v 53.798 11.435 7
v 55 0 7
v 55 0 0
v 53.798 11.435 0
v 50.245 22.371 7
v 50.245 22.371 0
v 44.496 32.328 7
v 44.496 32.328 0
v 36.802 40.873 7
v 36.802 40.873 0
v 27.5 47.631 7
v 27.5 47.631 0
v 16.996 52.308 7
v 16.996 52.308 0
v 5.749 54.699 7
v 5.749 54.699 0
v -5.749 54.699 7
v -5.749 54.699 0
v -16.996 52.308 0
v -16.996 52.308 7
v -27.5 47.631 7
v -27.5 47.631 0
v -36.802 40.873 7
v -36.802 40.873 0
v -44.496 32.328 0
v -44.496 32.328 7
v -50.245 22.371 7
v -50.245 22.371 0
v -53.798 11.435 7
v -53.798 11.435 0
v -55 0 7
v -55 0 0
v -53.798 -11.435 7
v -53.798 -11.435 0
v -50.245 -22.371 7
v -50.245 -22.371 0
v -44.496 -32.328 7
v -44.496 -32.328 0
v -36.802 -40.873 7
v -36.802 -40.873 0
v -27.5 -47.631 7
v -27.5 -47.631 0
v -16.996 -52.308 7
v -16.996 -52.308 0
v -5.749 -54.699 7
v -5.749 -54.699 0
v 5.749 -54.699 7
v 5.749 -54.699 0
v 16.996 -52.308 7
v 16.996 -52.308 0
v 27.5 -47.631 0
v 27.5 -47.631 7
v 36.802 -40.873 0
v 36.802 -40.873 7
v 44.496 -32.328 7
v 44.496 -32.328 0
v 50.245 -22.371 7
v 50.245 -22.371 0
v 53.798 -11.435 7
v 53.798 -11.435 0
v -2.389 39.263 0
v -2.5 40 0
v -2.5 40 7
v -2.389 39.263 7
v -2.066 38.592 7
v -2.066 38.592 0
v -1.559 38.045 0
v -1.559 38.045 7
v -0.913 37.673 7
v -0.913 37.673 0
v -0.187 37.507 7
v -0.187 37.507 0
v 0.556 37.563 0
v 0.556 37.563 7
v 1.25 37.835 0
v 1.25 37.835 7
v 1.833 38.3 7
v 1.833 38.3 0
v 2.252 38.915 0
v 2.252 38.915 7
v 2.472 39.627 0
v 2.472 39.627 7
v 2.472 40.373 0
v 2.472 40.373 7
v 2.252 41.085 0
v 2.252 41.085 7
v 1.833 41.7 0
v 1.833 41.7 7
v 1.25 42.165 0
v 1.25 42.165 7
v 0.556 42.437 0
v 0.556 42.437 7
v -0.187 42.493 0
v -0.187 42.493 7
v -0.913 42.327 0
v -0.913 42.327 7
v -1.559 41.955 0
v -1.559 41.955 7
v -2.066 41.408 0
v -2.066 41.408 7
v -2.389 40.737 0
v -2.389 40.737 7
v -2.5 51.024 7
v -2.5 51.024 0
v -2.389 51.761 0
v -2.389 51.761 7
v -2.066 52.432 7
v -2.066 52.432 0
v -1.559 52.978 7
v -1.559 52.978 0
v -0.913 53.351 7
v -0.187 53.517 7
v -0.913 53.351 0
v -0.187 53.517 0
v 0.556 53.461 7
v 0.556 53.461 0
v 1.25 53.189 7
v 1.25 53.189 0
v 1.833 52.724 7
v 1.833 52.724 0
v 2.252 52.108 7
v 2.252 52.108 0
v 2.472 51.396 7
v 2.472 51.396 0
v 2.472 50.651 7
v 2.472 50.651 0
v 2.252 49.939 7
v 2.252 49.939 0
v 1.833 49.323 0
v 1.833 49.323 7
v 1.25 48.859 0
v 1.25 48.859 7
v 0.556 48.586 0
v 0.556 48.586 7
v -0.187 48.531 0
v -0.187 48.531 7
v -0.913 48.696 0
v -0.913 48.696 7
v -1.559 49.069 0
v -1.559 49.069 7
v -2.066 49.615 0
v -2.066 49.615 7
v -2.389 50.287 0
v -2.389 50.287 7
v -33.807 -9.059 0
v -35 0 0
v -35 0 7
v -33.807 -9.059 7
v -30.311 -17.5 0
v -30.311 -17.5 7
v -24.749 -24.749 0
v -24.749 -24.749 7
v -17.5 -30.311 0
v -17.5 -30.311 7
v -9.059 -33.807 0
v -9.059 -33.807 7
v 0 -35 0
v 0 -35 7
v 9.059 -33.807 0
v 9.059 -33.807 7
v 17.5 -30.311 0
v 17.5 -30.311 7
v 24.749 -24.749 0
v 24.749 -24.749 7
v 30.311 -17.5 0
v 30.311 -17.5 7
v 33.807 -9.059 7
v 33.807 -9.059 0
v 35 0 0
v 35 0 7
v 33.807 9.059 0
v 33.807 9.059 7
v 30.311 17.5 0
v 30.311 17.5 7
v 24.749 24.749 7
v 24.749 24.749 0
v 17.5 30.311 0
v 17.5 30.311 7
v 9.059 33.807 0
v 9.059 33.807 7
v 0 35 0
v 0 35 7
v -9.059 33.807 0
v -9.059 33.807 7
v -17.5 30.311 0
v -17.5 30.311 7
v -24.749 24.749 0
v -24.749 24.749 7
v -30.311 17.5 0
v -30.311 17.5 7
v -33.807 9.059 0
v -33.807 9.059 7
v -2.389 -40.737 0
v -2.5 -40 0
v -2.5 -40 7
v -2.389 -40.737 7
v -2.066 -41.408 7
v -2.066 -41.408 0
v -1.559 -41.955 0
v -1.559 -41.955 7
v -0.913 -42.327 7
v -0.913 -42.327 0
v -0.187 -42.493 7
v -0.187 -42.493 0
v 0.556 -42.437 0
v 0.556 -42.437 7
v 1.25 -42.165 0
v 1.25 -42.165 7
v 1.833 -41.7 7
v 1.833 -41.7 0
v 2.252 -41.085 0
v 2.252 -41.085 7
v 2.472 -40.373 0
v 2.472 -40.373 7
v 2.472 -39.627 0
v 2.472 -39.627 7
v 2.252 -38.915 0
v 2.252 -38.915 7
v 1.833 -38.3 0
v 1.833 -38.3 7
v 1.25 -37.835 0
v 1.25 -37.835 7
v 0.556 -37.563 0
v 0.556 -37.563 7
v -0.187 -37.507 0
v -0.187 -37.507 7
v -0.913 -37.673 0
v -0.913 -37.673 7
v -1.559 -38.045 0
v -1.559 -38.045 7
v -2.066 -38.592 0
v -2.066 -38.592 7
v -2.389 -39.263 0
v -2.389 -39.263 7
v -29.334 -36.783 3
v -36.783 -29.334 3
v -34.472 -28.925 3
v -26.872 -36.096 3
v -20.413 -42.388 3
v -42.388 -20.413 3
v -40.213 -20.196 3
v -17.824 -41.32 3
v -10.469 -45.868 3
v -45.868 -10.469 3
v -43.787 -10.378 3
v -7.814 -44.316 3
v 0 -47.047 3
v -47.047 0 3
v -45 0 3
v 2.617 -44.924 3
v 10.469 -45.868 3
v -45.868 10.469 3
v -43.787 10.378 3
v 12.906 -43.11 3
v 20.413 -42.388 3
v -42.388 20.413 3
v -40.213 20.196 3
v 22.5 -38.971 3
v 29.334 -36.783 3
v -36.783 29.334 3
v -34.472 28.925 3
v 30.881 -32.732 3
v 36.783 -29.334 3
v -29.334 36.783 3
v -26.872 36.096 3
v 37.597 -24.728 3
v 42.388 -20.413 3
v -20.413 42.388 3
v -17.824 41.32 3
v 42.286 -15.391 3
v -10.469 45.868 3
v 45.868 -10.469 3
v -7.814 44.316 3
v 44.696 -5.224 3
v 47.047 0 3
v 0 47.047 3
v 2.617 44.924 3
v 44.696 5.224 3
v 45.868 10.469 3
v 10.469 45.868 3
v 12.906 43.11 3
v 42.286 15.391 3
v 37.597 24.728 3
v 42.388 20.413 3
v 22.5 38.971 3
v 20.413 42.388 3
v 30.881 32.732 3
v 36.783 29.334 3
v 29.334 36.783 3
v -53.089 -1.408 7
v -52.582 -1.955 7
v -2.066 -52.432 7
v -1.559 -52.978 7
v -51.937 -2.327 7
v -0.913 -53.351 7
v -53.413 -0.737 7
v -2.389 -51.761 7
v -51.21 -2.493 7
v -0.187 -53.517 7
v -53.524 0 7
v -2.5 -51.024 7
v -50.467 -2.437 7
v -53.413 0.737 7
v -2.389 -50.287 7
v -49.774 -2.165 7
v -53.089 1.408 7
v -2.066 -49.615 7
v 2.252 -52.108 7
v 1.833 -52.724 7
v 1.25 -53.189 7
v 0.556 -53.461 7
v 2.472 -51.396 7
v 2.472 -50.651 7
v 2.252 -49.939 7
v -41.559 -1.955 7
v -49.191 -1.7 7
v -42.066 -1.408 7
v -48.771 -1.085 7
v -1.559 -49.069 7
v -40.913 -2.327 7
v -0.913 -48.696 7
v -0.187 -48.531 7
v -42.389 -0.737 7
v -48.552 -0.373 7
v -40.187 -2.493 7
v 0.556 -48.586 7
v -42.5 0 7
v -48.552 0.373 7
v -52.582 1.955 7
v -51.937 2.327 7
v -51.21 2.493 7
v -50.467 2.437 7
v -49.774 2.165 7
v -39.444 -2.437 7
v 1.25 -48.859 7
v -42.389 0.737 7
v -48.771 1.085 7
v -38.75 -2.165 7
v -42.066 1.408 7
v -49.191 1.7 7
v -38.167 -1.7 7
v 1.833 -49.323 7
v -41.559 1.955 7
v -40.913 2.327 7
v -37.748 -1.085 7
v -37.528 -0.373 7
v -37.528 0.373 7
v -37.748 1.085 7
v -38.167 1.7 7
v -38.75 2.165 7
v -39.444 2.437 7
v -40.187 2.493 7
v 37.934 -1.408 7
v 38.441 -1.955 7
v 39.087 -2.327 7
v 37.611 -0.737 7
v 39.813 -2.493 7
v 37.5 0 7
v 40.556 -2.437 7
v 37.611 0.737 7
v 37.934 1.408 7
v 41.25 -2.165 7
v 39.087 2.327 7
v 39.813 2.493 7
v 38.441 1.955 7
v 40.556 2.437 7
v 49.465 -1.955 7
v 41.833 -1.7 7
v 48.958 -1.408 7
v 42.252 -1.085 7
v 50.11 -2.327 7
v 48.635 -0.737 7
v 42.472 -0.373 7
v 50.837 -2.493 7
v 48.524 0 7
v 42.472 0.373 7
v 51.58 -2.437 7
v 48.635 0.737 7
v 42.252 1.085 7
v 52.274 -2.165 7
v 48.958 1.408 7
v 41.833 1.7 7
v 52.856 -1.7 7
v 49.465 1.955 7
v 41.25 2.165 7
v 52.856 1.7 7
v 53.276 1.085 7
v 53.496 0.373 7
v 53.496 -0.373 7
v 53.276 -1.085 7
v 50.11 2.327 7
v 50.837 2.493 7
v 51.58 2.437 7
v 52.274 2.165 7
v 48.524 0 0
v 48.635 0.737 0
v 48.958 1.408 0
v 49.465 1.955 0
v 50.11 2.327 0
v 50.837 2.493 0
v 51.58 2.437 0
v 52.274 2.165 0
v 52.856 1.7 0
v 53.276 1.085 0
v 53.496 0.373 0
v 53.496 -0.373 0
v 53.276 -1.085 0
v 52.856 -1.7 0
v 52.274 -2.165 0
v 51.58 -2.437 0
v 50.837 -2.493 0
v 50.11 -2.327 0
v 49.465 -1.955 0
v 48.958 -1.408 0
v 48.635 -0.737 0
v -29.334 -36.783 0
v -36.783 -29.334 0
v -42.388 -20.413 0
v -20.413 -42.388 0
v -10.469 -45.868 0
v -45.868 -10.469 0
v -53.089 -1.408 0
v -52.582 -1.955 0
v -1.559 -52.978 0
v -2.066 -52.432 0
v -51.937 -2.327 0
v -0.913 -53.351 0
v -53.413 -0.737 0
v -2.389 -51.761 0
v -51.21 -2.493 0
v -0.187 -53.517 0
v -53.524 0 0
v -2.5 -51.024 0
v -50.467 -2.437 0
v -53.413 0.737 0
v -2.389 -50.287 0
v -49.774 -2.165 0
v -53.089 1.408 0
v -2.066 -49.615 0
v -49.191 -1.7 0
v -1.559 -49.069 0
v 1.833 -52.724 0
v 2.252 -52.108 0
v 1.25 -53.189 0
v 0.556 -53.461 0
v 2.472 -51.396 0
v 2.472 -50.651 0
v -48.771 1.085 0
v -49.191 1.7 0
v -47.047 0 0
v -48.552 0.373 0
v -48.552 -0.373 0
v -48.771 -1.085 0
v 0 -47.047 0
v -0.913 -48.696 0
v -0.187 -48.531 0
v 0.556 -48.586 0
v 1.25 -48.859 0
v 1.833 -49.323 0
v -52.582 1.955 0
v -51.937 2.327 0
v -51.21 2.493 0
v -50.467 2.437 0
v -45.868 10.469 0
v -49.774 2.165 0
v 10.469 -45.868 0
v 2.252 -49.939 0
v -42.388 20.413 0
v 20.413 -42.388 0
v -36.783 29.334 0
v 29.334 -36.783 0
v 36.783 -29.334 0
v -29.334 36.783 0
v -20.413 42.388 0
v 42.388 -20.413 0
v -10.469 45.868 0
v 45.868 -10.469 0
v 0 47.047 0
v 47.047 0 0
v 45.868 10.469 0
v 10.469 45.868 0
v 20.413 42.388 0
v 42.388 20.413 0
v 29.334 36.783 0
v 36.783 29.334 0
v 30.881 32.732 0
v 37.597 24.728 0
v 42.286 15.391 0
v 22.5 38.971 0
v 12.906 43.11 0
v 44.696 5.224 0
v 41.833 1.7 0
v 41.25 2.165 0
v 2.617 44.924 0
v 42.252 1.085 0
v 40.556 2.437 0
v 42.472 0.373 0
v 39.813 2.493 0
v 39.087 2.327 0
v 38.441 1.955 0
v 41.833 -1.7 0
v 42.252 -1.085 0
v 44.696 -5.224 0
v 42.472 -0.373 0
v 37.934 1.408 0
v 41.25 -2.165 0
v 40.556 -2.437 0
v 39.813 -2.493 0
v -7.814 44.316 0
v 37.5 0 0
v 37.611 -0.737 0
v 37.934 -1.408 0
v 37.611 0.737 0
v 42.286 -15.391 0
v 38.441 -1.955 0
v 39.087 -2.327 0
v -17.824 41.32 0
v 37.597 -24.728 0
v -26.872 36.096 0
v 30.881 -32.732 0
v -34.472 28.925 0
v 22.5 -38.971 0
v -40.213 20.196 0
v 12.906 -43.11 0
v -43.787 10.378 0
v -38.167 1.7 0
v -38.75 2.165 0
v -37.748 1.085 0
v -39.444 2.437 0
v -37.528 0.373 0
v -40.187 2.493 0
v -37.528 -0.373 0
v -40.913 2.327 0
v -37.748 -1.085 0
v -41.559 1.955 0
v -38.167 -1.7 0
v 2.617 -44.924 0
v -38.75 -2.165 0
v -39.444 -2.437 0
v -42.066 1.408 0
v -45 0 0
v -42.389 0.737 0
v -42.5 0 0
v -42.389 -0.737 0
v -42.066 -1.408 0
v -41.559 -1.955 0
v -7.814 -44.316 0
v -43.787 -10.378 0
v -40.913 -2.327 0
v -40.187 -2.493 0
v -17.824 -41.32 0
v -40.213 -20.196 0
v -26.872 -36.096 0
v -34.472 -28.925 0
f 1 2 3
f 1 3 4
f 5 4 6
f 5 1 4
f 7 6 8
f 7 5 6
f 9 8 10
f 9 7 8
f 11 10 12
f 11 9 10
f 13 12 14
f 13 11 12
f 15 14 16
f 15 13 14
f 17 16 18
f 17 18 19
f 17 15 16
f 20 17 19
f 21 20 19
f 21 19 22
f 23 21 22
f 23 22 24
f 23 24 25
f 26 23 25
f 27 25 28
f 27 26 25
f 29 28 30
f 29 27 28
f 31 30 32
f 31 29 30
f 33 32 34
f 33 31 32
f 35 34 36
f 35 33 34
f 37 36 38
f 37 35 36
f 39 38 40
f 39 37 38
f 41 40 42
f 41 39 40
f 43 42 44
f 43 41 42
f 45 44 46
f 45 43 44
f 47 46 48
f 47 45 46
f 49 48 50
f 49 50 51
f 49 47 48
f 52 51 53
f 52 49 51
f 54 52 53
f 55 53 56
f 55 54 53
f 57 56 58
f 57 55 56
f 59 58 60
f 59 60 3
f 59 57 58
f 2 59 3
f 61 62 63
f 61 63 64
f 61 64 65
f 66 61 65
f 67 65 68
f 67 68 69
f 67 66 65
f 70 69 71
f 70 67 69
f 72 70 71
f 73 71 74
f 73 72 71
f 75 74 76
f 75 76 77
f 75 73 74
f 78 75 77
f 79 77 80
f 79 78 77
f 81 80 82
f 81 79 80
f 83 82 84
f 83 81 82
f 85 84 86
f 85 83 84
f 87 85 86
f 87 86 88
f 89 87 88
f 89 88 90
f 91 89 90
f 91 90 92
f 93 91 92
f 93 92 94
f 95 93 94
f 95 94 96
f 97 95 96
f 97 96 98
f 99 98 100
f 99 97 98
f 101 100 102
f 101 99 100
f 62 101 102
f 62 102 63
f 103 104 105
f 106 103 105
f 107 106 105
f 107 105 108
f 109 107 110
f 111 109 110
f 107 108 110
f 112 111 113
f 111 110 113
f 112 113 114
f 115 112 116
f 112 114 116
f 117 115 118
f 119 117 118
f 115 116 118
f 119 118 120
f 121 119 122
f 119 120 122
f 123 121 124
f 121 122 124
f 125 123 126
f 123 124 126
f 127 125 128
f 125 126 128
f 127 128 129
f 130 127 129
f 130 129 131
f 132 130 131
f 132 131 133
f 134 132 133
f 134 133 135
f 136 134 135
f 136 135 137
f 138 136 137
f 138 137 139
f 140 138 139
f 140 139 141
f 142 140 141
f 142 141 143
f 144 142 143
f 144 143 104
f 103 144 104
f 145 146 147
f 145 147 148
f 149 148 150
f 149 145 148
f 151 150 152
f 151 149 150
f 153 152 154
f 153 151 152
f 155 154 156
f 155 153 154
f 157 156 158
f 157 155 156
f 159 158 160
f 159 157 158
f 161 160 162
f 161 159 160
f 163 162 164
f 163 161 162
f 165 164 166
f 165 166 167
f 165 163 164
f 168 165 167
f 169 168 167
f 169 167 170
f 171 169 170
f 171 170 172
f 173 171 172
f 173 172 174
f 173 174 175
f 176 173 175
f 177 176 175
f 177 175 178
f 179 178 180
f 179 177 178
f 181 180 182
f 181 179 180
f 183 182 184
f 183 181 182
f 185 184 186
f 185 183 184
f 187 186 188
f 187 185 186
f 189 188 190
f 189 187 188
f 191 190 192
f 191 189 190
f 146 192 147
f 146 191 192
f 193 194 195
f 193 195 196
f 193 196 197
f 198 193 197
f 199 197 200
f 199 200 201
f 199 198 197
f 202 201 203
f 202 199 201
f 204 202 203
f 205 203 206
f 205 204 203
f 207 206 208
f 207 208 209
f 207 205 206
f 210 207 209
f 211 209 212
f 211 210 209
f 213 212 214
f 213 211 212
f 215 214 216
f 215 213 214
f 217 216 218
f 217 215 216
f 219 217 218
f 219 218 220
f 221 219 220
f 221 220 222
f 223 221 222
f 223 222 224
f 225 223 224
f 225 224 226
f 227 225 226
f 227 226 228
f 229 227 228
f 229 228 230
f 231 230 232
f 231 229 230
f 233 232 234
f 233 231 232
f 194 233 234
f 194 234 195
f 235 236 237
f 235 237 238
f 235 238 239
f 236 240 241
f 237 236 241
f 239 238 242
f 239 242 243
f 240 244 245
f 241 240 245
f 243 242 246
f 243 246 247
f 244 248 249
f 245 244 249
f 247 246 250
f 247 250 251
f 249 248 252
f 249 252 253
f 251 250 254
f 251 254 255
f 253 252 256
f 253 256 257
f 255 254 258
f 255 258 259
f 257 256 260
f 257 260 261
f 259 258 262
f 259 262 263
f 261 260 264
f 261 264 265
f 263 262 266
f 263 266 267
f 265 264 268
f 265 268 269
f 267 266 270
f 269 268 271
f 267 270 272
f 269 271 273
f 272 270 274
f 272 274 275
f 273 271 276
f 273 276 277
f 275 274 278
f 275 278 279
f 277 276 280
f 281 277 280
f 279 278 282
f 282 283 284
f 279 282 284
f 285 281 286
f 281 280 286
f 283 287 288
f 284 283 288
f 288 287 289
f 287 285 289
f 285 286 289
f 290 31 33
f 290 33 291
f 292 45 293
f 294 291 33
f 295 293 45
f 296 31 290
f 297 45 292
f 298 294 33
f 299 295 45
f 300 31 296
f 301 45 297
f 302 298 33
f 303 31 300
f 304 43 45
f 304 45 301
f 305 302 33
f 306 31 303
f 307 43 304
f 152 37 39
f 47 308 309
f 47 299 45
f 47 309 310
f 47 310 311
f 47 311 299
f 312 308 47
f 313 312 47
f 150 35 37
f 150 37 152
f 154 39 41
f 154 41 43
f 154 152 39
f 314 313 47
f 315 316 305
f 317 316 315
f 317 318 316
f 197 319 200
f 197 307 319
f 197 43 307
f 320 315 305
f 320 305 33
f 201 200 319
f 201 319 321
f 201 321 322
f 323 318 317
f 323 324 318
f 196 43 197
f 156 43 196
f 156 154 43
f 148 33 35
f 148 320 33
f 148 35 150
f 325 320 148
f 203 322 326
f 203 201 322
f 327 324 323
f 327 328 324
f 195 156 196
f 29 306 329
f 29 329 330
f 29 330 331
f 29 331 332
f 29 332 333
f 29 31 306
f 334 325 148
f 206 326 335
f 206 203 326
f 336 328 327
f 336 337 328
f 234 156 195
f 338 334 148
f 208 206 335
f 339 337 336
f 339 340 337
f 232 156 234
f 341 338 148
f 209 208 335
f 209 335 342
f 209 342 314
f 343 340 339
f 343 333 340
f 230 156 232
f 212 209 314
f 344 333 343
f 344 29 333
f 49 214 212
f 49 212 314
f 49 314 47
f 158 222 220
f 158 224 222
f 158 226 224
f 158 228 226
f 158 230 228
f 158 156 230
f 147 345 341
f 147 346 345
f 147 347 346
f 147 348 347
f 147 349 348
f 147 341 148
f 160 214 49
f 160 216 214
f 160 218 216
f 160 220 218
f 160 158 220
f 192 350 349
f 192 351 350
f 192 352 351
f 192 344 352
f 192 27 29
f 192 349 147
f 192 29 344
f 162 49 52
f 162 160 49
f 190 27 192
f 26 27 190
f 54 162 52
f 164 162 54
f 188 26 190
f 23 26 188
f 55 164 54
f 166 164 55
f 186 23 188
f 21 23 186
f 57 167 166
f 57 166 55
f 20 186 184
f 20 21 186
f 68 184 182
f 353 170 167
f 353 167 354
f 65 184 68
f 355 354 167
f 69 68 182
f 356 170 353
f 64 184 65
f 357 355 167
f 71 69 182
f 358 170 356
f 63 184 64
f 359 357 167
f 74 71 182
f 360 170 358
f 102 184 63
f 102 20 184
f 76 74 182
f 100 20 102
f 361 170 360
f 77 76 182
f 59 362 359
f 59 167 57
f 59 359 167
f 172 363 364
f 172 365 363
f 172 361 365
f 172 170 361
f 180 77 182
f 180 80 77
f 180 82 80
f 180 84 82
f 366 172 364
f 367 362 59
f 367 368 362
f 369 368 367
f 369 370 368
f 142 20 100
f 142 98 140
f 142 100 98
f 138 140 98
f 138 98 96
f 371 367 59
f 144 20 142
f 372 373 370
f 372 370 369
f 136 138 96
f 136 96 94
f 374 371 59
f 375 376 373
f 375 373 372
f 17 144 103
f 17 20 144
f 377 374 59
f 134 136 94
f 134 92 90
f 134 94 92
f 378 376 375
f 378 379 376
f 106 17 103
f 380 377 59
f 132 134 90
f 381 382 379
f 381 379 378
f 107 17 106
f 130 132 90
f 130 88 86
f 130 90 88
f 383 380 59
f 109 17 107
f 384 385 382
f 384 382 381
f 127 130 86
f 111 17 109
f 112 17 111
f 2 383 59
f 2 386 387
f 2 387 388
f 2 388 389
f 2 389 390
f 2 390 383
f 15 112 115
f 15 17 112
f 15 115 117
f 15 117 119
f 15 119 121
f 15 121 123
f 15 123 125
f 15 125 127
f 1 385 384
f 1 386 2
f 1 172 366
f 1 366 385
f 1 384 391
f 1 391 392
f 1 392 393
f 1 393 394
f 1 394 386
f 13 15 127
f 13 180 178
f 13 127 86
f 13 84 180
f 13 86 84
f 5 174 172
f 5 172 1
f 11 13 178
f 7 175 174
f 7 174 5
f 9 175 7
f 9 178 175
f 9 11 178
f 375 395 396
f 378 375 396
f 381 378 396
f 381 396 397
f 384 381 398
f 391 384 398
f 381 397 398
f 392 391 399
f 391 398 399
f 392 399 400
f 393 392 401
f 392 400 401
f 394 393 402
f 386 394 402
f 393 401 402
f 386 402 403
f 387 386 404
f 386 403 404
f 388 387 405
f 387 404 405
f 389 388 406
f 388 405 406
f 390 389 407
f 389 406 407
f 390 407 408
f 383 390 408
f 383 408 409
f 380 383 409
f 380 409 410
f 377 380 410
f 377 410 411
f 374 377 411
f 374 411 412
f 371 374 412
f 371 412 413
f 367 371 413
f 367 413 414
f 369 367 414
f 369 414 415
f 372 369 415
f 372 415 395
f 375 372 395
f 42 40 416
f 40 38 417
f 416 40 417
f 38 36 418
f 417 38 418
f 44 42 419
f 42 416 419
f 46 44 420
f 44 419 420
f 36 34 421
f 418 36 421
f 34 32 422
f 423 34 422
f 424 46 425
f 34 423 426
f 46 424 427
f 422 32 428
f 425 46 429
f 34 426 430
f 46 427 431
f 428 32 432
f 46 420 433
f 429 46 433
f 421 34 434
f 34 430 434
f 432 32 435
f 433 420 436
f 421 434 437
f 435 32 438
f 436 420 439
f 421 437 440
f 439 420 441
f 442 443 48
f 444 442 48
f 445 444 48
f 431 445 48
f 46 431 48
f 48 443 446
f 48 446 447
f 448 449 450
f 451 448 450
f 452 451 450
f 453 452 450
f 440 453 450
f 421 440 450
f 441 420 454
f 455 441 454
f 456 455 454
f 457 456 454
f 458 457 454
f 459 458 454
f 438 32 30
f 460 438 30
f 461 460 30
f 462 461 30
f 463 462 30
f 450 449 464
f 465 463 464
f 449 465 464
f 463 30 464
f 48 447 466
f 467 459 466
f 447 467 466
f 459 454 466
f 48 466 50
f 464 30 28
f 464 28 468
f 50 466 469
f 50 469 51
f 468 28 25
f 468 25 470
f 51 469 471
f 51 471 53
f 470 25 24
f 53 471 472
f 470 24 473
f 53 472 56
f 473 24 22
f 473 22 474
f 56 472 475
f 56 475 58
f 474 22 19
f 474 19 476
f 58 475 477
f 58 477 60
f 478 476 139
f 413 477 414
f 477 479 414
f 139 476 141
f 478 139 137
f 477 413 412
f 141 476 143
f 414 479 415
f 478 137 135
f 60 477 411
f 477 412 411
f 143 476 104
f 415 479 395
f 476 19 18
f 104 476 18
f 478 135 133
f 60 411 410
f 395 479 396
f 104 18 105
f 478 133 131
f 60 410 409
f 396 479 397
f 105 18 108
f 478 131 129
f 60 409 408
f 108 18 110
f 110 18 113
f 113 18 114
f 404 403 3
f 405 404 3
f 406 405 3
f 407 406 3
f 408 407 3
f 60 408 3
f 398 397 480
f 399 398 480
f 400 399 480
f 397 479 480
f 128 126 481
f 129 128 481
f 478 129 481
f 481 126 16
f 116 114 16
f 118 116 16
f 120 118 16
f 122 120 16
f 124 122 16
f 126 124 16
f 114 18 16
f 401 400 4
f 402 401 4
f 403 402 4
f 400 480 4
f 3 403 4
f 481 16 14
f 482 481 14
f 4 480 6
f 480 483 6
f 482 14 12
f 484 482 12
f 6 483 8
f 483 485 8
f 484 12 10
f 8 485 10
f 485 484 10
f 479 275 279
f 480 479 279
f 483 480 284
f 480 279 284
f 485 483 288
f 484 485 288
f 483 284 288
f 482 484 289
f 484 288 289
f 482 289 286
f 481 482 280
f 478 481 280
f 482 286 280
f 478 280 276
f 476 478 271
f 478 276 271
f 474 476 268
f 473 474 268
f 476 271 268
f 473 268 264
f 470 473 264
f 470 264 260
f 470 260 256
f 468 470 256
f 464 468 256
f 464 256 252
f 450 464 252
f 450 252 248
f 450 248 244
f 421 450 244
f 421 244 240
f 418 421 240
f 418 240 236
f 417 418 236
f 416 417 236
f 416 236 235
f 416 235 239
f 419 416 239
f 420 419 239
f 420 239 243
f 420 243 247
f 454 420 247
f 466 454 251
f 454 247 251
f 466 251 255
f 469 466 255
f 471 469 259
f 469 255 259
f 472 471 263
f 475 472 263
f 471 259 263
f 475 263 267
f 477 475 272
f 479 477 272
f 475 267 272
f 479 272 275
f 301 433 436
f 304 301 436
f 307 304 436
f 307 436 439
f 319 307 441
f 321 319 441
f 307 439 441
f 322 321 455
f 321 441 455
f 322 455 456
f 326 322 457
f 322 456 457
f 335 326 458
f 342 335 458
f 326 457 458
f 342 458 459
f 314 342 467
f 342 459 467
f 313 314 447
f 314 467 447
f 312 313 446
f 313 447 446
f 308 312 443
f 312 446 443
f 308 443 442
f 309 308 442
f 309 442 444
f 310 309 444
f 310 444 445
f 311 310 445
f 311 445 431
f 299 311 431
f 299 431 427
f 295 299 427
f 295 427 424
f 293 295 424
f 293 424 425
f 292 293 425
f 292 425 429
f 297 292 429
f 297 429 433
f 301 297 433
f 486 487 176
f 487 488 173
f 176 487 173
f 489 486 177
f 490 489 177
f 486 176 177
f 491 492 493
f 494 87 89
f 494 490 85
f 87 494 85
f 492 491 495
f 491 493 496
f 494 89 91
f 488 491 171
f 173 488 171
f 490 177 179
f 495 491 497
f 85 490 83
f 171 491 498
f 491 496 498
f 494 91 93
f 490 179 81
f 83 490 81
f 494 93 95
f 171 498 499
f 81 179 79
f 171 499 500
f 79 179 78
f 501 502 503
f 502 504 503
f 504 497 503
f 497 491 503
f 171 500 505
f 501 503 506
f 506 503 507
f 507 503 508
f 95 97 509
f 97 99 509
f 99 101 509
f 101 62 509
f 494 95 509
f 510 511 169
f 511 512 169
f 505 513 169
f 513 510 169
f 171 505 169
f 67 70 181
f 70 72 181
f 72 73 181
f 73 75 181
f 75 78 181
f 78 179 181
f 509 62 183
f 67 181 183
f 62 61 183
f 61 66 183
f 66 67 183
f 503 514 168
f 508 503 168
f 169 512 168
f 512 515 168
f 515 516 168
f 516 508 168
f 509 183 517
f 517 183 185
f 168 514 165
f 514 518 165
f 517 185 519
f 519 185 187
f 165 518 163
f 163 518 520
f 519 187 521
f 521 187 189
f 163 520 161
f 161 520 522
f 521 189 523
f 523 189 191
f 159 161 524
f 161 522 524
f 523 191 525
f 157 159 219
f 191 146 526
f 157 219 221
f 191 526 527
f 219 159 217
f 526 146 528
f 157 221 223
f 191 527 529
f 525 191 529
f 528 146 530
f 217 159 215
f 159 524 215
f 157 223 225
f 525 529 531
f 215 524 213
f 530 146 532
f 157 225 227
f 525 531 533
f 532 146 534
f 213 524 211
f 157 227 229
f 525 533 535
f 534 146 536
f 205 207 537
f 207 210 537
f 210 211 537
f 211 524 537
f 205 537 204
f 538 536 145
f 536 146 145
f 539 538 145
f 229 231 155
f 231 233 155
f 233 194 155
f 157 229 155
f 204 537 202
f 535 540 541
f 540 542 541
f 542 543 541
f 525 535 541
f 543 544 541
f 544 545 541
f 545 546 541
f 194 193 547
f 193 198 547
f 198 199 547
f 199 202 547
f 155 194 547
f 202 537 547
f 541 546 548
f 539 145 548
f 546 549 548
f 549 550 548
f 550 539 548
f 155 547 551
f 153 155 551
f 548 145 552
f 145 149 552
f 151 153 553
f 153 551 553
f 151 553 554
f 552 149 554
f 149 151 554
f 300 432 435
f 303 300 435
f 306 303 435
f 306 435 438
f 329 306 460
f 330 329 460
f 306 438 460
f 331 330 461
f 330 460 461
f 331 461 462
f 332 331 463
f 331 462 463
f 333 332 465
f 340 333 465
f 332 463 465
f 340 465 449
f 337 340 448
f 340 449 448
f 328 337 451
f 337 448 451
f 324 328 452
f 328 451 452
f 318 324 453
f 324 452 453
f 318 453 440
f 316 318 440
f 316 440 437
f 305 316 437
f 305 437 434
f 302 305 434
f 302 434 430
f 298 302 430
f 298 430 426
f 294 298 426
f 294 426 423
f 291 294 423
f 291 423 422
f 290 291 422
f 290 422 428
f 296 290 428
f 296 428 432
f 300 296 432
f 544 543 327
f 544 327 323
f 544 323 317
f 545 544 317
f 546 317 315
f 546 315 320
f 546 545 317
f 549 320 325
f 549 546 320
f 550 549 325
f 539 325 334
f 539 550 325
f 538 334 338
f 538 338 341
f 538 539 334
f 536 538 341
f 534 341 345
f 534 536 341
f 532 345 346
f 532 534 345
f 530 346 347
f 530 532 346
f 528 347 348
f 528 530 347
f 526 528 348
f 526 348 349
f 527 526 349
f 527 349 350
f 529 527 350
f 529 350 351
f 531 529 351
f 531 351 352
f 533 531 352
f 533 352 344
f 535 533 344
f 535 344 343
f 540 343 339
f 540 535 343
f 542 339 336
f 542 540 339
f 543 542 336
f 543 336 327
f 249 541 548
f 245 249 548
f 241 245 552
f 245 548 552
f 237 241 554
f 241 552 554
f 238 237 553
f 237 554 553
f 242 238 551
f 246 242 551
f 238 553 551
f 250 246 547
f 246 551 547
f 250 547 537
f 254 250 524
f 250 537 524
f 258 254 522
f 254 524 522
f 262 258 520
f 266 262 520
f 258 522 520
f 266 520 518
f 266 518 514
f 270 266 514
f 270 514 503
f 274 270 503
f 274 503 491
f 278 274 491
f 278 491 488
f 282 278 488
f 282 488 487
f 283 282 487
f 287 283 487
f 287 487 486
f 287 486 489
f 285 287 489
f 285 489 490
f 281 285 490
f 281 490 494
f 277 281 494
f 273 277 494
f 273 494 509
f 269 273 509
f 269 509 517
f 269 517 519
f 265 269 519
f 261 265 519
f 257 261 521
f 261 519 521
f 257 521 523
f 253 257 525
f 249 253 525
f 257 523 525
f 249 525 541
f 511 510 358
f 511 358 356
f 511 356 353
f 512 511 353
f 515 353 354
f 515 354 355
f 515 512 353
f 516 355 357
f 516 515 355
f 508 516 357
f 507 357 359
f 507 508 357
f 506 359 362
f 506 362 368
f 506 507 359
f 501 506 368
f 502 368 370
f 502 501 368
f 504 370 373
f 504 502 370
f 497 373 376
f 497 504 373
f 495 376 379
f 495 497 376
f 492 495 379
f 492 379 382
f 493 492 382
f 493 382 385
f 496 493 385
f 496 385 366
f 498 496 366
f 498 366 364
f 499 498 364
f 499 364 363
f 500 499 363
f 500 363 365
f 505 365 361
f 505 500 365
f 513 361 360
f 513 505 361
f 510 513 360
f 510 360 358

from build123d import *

# Parameters (mm, degrees)
SKETCH1_R           = 45
SKETCH1_R_2         = 35
SKETCH1_R_3         = 2.5
BOSS_EXTRUDE1_DEPTH = 7
SKETCH2_R           = 55
SKETCH2_R_2         = 47.047288935
BOSS_EXTRUDE3_DEPTH = 7
BOSS_EXTRUDE4_START = -4
SKETCH3_R           = 47.047288935
SKETCH3_R_2         = 45
BOSS_EXTRUDE4_DEPTH = 4
SKETCH4_R           = 2.5
CUT_EXTRUDE1_DEPTH  = 79.096094653


with BuildPart() as part:
    # Sketch1 → Boss-Extrude1 (new body)
    with BuildSketch(Plane.XY):
        with Locations(Location((0, 0, 0), (0, 0, 180))):
            Circle(SKETCH1_R)
        with Locations(Location((0, 0, 0), (0, 0, 180))):
            Circle(SKETCH1_R_2, mode=Mode.SUBTRACT)
        with Locations(Location((0, 40, 0), (0, 0, 180))):
            Circle(SKETCH1_R_3, mode=Mode.SUBTRACT)
        with Locations(Location((40, 0, 0), (0, 0, 180))):
            Circle(SKETCH1_R_3, mode=Mode.SUBTRACT)
        with Locations(Location((0, -40, 0), (0, 0, 180))):
            Circle(SKETCH1_R_3, mode=Mode.SUBTRACT)
        with Locations(Location((-40, 0, 0), (0, 0, 180))):
            Circle(SKETCH1_R_3, mode=Mode.SUBTRACT)
    extrude(amount=BOSS_EXTRUDE1_DEPTH)



with BuildPart() as body_2:
    # Sketch2 → Boss-Extrude3 (new body)
    with BuildSketch(Plane.XY.offset(7)):
        Circle(SKETCH2_R)
        Circle(SKETCH2_R_2, mode=Mode.SUBTRACT)
    extrude(amount=-BOSS_EXTRUDE3_DEPTH)


with BuildPart() as part_1:
    add(part.part)

    add(body_2.part)  # Boss-Extrude4 merges body 2
    # Sketch3 → Boss-Extrude4 (add)
    with BuildSketch(Plane.XY.offset(7).offset(BOSS_EXTRUDE4_START)):
        Circle(SKETCH3_R)
        with Locations(Location((0, 0, 0), (0, 0, 180))):
            Circle(SKETCH3_R_2, mode=Mode.SUBTRACT)
    extrude(amount=BOSS_EXTRUDE4_DEPTH)

    # Sketch4 → Cut-Extrude1 (cut, through all)
    with BuildSketch(Plane(origin=(0, 0, 0), x_dir=(-1, 0, 0), z_dir=(0, 0, -1))):
        with Locations((0, -51.023644468)):
            Circle(SKETCH4_R)
        with Locations((-51.023644468, 0)):
            Circle(SKETCH4_R)
        with Locations((0, 51.023644468)):
            Circle(SKETCH4_R)
        with Locations((51.023644468, 0)):
            Circle(SKETCH4_R)
    extrude(amount=-CUT_EXTRUDE1_DEPTH, mode=Mode.SUBTRACT)


solid = part_1.part
